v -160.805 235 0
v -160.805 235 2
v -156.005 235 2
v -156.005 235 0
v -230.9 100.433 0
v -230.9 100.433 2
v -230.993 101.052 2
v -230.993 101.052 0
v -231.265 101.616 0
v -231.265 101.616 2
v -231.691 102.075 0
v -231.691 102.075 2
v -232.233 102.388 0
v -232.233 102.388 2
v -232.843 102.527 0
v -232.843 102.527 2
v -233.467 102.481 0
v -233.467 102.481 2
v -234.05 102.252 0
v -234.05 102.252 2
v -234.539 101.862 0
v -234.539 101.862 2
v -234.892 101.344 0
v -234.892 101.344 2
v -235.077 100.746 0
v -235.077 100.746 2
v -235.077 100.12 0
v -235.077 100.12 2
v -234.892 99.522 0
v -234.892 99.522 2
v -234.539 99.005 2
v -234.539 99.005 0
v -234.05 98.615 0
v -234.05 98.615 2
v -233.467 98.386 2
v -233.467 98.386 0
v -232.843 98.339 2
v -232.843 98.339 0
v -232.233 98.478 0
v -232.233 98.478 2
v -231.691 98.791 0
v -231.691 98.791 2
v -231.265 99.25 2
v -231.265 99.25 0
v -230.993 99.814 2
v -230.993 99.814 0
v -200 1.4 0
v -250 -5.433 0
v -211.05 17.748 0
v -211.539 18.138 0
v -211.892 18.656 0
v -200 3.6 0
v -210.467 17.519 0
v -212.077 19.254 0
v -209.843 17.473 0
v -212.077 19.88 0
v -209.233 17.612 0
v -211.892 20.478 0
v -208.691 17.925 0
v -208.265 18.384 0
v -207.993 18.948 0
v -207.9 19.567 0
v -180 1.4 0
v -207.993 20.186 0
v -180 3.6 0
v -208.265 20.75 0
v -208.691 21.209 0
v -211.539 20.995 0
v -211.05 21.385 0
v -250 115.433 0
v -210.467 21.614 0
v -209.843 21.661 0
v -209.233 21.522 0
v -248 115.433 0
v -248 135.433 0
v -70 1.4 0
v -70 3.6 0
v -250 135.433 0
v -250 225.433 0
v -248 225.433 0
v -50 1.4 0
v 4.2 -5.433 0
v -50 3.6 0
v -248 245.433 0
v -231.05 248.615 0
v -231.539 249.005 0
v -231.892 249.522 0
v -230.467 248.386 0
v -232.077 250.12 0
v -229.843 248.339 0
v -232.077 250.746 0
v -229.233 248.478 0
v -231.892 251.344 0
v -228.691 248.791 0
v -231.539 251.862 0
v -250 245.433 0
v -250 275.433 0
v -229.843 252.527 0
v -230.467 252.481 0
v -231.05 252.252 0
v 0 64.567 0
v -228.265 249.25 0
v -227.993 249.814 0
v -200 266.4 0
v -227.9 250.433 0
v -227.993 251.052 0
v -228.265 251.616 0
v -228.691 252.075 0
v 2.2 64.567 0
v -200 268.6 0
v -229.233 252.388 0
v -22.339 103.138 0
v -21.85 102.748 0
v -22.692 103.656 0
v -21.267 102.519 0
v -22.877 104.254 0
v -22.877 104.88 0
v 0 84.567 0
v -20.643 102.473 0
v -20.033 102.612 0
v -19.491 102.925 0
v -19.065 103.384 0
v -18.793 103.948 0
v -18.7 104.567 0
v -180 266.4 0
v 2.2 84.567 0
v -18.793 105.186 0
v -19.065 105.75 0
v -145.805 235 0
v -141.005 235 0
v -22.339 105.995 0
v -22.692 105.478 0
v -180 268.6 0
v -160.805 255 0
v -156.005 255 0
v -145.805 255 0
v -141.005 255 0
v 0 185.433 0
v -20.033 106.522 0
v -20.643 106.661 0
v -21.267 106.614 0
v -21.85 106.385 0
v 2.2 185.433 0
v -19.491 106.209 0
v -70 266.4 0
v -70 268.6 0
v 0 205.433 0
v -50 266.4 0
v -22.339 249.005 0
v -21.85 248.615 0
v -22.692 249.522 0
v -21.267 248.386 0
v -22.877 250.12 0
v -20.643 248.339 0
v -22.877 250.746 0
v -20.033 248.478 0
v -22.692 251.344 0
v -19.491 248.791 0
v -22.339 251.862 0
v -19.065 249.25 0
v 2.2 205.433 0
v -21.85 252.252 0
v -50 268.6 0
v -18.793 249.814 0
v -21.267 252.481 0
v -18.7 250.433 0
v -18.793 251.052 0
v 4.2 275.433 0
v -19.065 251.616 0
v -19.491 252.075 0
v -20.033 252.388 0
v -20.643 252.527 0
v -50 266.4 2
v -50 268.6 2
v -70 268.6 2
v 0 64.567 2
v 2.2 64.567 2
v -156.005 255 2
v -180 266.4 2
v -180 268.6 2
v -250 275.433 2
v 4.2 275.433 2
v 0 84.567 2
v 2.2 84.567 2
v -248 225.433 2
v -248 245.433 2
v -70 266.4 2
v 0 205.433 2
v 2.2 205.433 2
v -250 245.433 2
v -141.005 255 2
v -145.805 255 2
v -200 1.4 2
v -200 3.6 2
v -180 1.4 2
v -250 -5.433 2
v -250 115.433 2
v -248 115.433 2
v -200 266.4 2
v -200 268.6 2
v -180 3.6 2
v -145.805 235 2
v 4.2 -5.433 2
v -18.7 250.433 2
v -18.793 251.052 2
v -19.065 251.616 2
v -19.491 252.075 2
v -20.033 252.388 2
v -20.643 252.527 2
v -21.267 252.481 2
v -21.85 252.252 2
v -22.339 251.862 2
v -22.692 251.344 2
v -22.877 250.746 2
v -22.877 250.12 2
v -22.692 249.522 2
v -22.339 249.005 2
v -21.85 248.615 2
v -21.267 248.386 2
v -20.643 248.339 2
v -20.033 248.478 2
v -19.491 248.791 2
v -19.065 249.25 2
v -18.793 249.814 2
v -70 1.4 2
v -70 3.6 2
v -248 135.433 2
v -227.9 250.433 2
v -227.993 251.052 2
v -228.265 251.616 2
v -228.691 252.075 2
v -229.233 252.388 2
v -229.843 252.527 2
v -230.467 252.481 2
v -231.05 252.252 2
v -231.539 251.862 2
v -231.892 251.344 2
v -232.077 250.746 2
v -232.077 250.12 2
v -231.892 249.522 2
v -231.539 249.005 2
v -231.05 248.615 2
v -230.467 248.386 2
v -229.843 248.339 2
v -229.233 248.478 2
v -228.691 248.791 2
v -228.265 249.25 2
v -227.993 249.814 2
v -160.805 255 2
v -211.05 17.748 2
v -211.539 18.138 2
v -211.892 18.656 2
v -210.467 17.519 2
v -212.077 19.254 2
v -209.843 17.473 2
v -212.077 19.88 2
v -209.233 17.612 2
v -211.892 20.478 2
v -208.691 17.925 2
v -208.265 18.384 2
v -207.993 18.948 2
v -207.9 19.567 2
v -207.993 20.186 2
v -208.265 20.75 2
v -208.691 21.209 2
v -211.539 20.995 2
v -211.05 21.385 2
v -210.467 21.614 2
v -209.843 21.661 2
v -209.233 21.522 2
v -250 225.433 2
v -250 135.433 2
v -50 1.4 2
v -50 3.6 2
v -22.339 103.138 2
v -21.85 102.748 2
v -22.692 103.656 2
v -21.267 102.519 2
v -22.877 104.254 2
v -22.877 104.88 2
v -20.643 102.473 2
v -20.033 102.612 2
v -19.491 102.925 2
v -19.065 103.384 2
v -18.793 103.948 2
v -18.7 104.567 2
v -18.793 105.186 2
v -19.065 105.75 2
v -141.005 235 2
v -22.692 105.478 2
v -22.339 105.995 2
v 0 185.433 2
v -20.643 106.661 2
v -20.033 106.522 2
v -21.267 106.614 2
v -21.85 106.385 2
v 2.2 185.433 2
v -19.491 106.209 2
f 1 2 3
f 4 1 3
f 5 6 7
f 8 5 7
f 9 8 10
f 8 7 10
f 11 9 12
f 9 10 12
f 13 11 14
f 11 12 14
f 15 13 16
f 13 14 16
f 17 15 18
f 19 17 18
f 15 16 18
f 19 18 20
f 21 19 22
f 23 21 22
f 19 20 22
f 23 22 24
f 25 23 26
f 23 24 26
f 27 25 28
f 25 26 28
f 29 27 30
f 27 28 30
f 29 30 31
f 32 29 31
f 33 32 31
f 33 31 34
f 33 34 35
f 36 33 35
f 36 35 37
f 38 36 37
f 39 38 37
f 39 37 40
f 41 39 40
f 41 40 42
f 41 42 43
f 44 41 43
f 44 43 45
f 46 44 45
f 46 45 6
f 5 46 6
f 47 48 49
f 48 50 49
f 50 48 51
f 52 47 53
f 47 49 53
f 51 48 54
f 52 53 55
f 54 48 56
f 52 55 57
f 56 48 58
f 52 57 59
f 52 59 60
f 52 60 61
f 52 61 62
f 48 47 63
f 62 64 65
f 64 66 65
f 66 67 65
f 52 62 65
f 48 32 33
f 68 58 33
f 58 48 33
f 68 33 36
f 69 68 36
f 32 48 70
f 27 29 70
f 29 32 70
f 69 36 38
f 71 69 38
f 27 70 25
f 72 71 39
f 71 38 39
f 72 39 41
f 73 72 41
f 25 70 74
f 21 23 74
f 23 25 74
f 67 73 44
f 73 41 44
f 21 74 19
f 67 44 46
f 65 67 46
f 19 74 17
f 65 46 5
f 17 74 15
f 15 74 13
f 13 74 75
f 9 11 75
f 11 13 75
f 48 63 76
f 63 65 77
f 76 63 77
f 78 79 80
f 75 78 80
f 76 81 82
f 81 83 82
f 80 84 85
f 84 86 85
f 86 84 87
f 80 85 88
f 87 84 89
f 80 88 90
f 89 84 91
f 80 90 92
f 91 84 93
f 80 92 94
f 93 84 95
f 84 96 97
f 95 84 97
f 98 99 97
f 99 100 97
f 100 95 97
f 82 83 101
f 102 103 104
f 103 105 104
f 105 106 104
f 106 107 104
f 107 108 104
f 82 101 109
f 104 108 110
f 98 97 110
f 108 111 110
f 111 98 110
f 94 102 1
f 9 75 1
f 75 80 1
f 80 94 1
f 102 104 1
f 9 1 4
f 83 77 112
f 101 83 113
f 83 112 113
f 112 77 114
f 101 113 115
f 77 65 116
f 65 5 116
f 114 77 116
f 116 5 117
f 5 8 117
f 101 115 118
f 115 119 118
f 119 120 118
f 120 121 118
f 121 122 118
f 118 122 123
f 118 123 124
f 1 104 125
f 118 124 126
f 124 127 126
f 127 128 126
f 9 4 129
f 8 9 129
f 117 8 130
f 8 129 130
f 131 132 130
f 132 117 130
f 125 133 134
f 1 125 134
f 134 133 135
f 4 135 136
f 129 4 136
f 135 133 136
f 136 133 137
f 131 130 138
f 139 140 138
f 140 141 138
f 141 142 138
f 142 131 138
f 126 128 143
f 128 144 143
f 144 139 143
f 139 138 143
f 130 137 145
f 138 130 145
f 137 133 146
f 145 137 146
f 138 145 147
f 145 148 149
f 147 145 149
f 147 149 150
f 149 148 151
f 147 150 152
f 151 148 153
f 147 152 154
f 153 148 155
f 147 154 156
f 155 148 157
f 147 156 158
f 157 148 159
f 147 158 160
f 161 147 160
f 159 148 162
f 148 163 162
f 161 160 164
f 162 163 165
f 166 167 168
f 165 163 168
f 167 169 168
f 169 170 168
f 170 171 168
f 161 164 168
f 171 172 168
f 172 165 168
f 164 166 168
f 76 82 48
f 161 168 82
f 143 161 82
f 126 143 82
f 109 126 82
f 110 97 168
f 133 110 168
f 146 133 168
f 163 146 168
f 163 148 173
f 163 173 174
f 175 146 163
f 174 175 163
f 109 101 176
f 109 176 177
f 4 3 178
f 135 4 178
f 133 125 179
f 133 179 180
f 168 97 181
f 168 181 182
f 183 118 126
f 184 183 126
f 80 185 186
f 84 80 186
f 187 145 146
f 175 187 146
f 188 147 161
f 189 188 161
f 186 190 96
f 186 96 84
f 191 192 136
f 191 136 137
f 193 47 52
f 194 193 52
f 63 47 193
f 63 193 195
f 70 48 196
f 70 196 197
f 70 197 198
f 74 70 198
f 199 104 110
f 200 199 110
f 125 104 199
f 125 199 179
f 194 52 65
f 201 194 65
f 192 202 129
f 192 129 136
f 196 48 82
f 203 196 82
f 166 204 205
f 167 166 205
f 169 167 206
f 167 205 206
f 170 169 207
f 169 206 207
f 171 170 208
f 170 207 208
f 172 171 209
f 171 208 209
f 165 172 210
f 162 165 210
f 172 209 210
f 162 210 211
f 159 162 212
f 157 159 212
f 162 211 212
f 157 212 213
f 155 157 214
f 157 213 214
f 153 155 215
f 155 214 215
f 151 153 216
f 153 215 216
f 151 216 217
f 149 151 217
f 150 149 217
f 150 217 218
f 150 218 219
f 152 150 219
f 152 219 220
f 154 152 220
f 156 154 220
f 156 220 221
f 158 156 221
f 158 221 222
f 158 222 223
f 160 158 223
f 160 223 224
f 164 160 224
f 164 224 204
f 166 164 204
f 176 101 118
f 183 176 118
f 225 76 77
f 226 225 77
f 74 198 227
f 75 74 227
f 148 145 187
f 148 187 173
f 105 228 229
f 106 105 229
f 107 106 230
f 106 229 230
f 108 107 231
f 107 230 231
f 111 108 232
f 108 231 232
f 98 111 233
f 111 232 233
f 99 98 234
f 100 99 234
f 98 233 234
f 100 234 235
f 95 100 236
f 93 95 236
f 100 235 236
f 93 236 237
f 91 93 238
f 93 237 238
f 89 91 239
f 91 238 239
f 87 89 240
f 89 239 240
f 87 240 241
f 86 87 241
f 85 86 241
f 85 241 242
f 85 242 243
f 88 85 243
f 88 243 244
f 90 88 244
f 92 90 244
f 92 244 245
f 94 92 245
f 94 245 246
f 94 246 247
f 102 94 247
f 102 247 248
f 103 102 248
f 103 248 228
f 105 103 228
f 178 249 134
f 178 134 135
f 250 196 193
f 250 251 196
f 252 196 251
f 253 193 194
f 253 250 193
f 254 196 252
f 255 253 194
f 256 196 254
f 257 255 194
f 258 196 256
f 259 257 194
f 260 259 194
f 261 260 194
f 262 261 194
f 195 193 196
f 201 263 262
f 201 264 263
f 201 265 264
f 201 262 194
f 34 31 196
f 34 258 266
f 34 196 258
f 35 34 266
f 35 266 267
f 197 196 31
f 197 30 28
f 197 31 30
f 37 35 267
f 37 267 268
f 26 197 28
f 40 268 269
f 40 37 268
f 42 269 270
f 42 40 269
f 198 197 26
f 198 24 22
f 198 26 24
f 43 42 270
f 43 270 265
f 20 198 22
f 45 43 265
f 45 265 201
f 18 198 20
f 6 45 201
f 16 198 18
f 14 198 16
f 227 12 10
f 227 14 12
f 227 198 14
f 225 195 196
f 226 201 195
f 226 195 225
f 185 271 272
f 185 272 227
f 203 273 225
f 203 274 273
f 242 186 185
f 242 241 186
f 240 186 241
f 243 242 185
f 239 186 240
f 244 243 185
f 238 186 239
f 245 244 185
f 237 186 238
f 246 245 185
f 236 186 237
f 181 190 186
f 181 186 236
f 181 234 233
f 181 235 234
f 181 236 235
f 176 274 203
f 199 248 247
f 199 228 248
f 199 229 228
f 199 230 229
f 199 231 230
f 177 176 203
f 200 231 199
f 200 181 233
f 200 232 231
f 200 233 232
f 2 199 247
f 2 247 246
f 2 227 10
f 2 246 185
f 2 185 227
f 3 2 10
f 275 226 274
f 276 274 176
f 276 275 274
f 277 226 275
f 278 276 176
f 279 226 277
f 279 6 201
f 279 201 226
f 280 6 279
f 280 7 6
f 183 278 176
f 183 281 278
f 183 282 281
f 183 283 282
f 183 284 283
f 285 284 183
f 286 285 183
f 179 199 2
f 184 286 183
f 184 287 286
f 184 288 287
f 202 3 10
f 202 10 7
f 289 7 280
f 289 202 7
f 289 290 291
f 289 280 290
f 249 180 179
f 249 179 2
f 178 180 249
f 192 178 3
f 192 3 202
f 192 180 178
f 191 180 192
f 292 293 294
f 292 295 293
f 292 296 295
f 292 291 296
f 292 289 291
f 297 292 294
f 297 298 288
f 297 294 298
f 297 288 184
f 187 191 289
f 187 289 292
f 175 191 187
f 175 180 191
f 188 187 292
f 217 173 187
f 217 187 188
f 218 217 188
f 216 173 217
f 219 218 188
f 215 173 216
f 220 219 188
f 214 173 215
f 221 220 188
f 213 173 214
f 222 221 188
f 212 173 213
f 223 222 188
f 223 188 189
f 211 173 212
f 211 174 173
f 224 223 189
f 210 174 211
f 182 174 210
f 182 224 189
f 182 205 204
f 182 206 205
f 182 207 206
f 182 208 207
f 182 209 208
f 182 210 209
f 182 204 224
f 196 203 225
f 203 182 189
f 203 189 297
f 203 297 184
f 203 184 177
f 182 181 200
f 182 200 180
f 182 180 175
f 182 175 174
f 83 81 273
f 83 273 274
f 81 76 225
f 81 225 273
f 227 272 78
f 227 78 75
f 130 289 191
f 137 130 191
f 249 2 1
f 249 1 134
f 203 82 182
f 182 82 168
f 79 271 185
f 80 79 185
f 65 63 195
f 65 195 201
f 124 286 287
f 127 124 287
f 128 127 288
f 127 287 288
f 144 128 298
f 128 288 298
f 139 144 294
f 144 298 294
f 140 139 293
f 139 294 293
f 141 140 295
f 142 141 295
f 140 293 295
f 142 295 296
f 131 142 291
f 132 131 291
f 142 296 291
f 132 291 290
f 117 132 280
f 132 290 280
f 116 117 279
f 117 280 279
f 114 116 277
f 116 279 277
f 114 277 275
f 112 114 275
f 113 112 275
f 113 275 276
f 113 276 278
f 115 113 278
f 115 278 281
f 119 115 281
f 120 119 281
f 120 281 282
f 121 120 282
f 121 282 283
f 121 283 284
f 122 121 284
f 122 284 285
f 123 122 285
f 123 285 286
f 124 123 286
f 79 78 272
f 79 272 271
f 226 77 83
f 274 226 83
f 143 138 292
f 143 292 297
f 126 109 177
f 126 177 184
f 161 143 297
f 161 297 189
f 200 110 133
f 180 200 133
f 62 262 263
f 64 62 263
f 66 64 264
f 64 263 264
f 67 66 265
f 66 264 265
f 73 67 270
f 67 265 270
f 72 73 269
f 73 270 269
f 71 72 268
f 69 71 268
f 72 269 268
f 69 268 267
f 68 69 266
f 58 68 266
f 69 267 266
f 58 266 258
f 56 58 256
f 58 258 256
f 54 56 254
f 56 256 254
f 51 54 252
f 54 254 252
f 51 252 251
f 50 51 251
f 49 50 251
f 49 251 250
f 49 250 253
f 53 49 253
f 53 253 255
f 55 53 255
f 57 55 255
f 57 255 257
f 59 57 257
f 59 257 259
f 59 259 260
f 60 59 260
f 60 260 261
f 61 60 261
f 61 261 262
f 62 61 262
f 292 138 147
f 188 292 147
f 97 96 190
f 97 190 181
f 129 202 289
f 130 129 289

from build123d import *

# Parameters (mm, degrees)
SKETCH1_W           = 254.2
SKETCH1_H           = 280.866666666
SKETCH1_W_2         = 20
SKETCH1_H_2         = 2.2
SKETCH1_W_3         = 2.2
SKETCH1_H_3         = 20
BOSS_EXTRUDE1_DEPTH = 2
SKETCH2_W           = 4.8
SKETCH2_H           = 20
CUT_EXTRUDE1_DEPTH  = 5
SKETCH3_R           = 2.1
CUT_EXTRUDE2_DEPTH  = 5
SKETCH4_R           = 2.1
CUT_EXTRUDE3_DEPTH  = 5
SKETCH5_R           = 2.1
CUT_EXTRUDE4_DEPTH  = 5
SKETCH6_R           = 2.1
CUT_EXTRUDE5_DEPTH  = 5
SKETCH7_W           = 2
SKETCH7_H           = 20
CUT_EXTRUDE6_DEPTH  = 10


with BuildPart() as part:
    # Sketch1 → Boss-Extrude1 (new body)
    with BuildSketch(Plane.XY):
        with Locations((-122.9, 135)):
            Rectangle(SKETCH1_W, SKETCH1_H)
        with Locations((-60, 267.5)):
            Rectangle(SKETCH1_W_2, SKETCH1_H_2, mode=Mode.SUBTRACT)
        with Locations((1.1, 74.566666667)):
            Rectangle(SKETCH1_W_3, SKETCH1_H_3, mode=Mode.SUBTRACT)
        with Locations((-190, 2.5)):
            Rectangle(SKETCH1_W_2, SKETCH1_H_2, mode=Mode.SUBTRACT)
        with Locations((1.1, 195.433333333)):
            Rectangle(SKETCH1_W_3, SKETCH1_H_3, mode=Mode.SUBTRACT)
        with Locations((-60, 2.5)):
            Rectangle(SKETCH1_W_2, SKETCH1_H_2, mode=Mode.SUBTRACT)
        with Locations((-190, 267.5)):
            Rectangle(SKETCH1_W_2, SKETCH1_H_2, mode=Mode.SUBTRACT)
    extrude(amount=BOSS_EXTRUDE1_DEPTH)

    # Sketch2 → Cut-Extrude1 (cut)
    with BuildSketch(Plane.XY.offset(2)):
        with Locations((-143.405234687, 245)):
            Rectangle(SKETCH2_W, SKETCH2_H)
        with Locations((-158.405234687, 245)):
            Rectangle(SKETCH2_W, SKETCH2_H)
    extrude(amount=-CUT_EXTRUDE1_DEPTH, mode=Mode.SUBTRACT)

    # Sketch3 → Cut-Extrude2 (cut)
    with BuildSketch(Plane.XY.offset(2)):
        with Locations((-230, 250.433333333)):
            Circle(SKETCH3_R)
        with Locations((-20.8, 250.433333333)):
            Circle(SKETCH3_R)
    extrude(amount=-CUT_EXTRUDE2_DEPTH, mode=Mode.SUBTRACT)

    # Sketch4 → Cut-Extrude3 (cut)
    with BuildSketch(Plane.XY.offset(2)):
        with Locations((-210, 19.566666667)):
            Circle(SKETCH4_R)
    extrude(amount=-CUT_EXTRUDE3_DEPTH, mode=Mode.SUBTRACT)

    # Sketch5 → Cut-Extrude4 (cut)
    with BuildSketch(Plane.XY.offset(2)):
        with Locations((-20.8, 104.566666667)):
            Circle(SKETCH5_R)
    extrude(amount=-CUT_EXTRUDE4_DEPTH, mode=Mode.SUBTRACT)

    # Sketch6 → Cut-Extrude5 (cut)
    with BuildSketch(Plane.XY.offset(2)):
        with Locations((-233, 100.433333333)):
            Circle(SKETCH6_R)
    extrude(amount=-CUT_EXTRUDE5_DEPTH, mode=Mode.SUBTRACT)

    # Sketch7 → Cut-Extrude6 (cut)
    with BuildSketch(Plane.XY.offset(2)):
        with Locations((-249, 235.433333333)):
            Rectangle(SKETCH7_W, SKETCH7_H)
        with Locations((-249, 125.433333333)):
            Rectangle(SKETCH7_W, SKETCH7_H)
    extrude(amount=-CUT_EXTRUDE6_DEPTH, mode=Mode.SUBTRACT)


solid = part.part
